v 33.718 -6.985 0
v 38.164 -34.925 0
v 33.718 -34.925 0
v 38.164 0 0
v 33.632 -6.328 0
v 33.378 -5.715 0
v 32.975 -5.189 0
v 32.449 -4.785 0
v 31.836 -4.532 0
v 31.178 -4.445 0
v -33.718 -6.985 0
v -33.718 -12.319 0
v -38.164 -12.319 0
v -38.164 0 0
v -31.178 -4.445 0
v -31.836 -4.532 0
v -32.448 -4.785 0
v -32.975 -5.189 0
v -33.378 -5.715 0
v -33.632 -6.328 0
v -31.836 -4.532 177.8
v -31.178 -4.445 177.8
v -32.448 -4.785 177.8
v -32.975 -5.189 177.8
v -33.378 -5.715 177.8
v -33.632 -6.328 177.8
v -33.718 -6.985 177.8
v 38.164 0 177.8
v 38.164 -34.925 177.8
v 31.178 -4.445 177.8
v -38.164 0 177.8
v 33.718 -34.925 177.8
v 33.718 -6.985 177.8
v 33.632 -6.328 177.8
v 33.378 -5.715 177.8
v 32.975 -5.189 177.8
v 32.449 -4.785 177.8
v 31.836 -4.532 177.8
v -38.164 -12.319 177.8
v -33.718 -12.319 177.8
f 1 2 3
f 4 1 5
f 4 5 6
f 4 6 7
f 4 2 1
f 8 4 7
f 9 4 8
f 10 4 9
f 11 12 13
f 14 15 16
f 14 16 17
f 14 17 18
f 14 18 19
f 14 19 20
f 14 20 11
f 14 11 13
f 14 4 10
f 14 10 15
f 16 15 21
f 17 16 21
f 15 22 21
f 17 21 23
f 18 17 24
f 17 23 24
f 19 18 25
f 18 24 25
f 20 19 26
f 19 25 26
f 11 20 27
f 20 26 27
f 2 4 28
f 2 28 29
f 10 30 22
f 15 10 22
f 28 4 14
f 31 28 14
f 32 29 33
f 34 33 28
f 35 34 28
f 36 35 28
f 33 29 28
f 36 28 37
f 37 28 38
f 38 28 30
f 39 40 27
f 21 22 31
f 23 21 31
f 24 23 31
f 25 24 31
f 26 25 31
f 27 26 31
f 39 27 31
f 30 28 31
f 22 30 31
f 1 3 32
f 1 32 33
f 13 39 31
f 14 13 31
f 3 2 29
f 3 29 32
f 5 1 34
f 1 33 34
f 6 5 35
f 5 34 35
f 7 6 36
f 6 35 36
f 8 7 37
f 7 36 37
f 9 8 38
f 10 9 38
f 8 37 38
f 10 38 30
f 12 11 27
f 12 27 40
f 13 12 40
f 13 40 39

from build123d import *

# Parameters (mm, degrees)
BOSS_EXTRUDE1_DEPTH = 177.8
FILLET1_R           = 2.54
FILLET2_R           = 2.54


with BuildPart() as part:
    # Sketch1 → Boss-Extrude1 (new body)
    with BuildSketch(Plane.XY):
        Polygon((0, 0), (38.1635, 0), (38.1635, -34.925), (33.7185, -34.925), (33.7185, -4.445), (-33.7185, -4.445), (-33.7185, -12.319), (-38.1635, -12.319), (-38.1635, 0), align=None)
    extrude(amount=BOSS_EXTRUDE1_DEPTH)

    # Fillet1
    fillet1_edges = [part.edges().sort_by_distance(p)[0] for p in [
        (33.7185, -4.445, 88.9),
    ]]
    fillet(fillet1_edges, radius=FILLET1_R)

    # Fillet2
    fillet2_edges = [part.edges().sort_by_distance(p)[0] for p in [
        (-33.7185, -4.445, 88.9),
    ]]
    fillet(fillet2_edges, radius=FILLET2_R)


solid = part.part
